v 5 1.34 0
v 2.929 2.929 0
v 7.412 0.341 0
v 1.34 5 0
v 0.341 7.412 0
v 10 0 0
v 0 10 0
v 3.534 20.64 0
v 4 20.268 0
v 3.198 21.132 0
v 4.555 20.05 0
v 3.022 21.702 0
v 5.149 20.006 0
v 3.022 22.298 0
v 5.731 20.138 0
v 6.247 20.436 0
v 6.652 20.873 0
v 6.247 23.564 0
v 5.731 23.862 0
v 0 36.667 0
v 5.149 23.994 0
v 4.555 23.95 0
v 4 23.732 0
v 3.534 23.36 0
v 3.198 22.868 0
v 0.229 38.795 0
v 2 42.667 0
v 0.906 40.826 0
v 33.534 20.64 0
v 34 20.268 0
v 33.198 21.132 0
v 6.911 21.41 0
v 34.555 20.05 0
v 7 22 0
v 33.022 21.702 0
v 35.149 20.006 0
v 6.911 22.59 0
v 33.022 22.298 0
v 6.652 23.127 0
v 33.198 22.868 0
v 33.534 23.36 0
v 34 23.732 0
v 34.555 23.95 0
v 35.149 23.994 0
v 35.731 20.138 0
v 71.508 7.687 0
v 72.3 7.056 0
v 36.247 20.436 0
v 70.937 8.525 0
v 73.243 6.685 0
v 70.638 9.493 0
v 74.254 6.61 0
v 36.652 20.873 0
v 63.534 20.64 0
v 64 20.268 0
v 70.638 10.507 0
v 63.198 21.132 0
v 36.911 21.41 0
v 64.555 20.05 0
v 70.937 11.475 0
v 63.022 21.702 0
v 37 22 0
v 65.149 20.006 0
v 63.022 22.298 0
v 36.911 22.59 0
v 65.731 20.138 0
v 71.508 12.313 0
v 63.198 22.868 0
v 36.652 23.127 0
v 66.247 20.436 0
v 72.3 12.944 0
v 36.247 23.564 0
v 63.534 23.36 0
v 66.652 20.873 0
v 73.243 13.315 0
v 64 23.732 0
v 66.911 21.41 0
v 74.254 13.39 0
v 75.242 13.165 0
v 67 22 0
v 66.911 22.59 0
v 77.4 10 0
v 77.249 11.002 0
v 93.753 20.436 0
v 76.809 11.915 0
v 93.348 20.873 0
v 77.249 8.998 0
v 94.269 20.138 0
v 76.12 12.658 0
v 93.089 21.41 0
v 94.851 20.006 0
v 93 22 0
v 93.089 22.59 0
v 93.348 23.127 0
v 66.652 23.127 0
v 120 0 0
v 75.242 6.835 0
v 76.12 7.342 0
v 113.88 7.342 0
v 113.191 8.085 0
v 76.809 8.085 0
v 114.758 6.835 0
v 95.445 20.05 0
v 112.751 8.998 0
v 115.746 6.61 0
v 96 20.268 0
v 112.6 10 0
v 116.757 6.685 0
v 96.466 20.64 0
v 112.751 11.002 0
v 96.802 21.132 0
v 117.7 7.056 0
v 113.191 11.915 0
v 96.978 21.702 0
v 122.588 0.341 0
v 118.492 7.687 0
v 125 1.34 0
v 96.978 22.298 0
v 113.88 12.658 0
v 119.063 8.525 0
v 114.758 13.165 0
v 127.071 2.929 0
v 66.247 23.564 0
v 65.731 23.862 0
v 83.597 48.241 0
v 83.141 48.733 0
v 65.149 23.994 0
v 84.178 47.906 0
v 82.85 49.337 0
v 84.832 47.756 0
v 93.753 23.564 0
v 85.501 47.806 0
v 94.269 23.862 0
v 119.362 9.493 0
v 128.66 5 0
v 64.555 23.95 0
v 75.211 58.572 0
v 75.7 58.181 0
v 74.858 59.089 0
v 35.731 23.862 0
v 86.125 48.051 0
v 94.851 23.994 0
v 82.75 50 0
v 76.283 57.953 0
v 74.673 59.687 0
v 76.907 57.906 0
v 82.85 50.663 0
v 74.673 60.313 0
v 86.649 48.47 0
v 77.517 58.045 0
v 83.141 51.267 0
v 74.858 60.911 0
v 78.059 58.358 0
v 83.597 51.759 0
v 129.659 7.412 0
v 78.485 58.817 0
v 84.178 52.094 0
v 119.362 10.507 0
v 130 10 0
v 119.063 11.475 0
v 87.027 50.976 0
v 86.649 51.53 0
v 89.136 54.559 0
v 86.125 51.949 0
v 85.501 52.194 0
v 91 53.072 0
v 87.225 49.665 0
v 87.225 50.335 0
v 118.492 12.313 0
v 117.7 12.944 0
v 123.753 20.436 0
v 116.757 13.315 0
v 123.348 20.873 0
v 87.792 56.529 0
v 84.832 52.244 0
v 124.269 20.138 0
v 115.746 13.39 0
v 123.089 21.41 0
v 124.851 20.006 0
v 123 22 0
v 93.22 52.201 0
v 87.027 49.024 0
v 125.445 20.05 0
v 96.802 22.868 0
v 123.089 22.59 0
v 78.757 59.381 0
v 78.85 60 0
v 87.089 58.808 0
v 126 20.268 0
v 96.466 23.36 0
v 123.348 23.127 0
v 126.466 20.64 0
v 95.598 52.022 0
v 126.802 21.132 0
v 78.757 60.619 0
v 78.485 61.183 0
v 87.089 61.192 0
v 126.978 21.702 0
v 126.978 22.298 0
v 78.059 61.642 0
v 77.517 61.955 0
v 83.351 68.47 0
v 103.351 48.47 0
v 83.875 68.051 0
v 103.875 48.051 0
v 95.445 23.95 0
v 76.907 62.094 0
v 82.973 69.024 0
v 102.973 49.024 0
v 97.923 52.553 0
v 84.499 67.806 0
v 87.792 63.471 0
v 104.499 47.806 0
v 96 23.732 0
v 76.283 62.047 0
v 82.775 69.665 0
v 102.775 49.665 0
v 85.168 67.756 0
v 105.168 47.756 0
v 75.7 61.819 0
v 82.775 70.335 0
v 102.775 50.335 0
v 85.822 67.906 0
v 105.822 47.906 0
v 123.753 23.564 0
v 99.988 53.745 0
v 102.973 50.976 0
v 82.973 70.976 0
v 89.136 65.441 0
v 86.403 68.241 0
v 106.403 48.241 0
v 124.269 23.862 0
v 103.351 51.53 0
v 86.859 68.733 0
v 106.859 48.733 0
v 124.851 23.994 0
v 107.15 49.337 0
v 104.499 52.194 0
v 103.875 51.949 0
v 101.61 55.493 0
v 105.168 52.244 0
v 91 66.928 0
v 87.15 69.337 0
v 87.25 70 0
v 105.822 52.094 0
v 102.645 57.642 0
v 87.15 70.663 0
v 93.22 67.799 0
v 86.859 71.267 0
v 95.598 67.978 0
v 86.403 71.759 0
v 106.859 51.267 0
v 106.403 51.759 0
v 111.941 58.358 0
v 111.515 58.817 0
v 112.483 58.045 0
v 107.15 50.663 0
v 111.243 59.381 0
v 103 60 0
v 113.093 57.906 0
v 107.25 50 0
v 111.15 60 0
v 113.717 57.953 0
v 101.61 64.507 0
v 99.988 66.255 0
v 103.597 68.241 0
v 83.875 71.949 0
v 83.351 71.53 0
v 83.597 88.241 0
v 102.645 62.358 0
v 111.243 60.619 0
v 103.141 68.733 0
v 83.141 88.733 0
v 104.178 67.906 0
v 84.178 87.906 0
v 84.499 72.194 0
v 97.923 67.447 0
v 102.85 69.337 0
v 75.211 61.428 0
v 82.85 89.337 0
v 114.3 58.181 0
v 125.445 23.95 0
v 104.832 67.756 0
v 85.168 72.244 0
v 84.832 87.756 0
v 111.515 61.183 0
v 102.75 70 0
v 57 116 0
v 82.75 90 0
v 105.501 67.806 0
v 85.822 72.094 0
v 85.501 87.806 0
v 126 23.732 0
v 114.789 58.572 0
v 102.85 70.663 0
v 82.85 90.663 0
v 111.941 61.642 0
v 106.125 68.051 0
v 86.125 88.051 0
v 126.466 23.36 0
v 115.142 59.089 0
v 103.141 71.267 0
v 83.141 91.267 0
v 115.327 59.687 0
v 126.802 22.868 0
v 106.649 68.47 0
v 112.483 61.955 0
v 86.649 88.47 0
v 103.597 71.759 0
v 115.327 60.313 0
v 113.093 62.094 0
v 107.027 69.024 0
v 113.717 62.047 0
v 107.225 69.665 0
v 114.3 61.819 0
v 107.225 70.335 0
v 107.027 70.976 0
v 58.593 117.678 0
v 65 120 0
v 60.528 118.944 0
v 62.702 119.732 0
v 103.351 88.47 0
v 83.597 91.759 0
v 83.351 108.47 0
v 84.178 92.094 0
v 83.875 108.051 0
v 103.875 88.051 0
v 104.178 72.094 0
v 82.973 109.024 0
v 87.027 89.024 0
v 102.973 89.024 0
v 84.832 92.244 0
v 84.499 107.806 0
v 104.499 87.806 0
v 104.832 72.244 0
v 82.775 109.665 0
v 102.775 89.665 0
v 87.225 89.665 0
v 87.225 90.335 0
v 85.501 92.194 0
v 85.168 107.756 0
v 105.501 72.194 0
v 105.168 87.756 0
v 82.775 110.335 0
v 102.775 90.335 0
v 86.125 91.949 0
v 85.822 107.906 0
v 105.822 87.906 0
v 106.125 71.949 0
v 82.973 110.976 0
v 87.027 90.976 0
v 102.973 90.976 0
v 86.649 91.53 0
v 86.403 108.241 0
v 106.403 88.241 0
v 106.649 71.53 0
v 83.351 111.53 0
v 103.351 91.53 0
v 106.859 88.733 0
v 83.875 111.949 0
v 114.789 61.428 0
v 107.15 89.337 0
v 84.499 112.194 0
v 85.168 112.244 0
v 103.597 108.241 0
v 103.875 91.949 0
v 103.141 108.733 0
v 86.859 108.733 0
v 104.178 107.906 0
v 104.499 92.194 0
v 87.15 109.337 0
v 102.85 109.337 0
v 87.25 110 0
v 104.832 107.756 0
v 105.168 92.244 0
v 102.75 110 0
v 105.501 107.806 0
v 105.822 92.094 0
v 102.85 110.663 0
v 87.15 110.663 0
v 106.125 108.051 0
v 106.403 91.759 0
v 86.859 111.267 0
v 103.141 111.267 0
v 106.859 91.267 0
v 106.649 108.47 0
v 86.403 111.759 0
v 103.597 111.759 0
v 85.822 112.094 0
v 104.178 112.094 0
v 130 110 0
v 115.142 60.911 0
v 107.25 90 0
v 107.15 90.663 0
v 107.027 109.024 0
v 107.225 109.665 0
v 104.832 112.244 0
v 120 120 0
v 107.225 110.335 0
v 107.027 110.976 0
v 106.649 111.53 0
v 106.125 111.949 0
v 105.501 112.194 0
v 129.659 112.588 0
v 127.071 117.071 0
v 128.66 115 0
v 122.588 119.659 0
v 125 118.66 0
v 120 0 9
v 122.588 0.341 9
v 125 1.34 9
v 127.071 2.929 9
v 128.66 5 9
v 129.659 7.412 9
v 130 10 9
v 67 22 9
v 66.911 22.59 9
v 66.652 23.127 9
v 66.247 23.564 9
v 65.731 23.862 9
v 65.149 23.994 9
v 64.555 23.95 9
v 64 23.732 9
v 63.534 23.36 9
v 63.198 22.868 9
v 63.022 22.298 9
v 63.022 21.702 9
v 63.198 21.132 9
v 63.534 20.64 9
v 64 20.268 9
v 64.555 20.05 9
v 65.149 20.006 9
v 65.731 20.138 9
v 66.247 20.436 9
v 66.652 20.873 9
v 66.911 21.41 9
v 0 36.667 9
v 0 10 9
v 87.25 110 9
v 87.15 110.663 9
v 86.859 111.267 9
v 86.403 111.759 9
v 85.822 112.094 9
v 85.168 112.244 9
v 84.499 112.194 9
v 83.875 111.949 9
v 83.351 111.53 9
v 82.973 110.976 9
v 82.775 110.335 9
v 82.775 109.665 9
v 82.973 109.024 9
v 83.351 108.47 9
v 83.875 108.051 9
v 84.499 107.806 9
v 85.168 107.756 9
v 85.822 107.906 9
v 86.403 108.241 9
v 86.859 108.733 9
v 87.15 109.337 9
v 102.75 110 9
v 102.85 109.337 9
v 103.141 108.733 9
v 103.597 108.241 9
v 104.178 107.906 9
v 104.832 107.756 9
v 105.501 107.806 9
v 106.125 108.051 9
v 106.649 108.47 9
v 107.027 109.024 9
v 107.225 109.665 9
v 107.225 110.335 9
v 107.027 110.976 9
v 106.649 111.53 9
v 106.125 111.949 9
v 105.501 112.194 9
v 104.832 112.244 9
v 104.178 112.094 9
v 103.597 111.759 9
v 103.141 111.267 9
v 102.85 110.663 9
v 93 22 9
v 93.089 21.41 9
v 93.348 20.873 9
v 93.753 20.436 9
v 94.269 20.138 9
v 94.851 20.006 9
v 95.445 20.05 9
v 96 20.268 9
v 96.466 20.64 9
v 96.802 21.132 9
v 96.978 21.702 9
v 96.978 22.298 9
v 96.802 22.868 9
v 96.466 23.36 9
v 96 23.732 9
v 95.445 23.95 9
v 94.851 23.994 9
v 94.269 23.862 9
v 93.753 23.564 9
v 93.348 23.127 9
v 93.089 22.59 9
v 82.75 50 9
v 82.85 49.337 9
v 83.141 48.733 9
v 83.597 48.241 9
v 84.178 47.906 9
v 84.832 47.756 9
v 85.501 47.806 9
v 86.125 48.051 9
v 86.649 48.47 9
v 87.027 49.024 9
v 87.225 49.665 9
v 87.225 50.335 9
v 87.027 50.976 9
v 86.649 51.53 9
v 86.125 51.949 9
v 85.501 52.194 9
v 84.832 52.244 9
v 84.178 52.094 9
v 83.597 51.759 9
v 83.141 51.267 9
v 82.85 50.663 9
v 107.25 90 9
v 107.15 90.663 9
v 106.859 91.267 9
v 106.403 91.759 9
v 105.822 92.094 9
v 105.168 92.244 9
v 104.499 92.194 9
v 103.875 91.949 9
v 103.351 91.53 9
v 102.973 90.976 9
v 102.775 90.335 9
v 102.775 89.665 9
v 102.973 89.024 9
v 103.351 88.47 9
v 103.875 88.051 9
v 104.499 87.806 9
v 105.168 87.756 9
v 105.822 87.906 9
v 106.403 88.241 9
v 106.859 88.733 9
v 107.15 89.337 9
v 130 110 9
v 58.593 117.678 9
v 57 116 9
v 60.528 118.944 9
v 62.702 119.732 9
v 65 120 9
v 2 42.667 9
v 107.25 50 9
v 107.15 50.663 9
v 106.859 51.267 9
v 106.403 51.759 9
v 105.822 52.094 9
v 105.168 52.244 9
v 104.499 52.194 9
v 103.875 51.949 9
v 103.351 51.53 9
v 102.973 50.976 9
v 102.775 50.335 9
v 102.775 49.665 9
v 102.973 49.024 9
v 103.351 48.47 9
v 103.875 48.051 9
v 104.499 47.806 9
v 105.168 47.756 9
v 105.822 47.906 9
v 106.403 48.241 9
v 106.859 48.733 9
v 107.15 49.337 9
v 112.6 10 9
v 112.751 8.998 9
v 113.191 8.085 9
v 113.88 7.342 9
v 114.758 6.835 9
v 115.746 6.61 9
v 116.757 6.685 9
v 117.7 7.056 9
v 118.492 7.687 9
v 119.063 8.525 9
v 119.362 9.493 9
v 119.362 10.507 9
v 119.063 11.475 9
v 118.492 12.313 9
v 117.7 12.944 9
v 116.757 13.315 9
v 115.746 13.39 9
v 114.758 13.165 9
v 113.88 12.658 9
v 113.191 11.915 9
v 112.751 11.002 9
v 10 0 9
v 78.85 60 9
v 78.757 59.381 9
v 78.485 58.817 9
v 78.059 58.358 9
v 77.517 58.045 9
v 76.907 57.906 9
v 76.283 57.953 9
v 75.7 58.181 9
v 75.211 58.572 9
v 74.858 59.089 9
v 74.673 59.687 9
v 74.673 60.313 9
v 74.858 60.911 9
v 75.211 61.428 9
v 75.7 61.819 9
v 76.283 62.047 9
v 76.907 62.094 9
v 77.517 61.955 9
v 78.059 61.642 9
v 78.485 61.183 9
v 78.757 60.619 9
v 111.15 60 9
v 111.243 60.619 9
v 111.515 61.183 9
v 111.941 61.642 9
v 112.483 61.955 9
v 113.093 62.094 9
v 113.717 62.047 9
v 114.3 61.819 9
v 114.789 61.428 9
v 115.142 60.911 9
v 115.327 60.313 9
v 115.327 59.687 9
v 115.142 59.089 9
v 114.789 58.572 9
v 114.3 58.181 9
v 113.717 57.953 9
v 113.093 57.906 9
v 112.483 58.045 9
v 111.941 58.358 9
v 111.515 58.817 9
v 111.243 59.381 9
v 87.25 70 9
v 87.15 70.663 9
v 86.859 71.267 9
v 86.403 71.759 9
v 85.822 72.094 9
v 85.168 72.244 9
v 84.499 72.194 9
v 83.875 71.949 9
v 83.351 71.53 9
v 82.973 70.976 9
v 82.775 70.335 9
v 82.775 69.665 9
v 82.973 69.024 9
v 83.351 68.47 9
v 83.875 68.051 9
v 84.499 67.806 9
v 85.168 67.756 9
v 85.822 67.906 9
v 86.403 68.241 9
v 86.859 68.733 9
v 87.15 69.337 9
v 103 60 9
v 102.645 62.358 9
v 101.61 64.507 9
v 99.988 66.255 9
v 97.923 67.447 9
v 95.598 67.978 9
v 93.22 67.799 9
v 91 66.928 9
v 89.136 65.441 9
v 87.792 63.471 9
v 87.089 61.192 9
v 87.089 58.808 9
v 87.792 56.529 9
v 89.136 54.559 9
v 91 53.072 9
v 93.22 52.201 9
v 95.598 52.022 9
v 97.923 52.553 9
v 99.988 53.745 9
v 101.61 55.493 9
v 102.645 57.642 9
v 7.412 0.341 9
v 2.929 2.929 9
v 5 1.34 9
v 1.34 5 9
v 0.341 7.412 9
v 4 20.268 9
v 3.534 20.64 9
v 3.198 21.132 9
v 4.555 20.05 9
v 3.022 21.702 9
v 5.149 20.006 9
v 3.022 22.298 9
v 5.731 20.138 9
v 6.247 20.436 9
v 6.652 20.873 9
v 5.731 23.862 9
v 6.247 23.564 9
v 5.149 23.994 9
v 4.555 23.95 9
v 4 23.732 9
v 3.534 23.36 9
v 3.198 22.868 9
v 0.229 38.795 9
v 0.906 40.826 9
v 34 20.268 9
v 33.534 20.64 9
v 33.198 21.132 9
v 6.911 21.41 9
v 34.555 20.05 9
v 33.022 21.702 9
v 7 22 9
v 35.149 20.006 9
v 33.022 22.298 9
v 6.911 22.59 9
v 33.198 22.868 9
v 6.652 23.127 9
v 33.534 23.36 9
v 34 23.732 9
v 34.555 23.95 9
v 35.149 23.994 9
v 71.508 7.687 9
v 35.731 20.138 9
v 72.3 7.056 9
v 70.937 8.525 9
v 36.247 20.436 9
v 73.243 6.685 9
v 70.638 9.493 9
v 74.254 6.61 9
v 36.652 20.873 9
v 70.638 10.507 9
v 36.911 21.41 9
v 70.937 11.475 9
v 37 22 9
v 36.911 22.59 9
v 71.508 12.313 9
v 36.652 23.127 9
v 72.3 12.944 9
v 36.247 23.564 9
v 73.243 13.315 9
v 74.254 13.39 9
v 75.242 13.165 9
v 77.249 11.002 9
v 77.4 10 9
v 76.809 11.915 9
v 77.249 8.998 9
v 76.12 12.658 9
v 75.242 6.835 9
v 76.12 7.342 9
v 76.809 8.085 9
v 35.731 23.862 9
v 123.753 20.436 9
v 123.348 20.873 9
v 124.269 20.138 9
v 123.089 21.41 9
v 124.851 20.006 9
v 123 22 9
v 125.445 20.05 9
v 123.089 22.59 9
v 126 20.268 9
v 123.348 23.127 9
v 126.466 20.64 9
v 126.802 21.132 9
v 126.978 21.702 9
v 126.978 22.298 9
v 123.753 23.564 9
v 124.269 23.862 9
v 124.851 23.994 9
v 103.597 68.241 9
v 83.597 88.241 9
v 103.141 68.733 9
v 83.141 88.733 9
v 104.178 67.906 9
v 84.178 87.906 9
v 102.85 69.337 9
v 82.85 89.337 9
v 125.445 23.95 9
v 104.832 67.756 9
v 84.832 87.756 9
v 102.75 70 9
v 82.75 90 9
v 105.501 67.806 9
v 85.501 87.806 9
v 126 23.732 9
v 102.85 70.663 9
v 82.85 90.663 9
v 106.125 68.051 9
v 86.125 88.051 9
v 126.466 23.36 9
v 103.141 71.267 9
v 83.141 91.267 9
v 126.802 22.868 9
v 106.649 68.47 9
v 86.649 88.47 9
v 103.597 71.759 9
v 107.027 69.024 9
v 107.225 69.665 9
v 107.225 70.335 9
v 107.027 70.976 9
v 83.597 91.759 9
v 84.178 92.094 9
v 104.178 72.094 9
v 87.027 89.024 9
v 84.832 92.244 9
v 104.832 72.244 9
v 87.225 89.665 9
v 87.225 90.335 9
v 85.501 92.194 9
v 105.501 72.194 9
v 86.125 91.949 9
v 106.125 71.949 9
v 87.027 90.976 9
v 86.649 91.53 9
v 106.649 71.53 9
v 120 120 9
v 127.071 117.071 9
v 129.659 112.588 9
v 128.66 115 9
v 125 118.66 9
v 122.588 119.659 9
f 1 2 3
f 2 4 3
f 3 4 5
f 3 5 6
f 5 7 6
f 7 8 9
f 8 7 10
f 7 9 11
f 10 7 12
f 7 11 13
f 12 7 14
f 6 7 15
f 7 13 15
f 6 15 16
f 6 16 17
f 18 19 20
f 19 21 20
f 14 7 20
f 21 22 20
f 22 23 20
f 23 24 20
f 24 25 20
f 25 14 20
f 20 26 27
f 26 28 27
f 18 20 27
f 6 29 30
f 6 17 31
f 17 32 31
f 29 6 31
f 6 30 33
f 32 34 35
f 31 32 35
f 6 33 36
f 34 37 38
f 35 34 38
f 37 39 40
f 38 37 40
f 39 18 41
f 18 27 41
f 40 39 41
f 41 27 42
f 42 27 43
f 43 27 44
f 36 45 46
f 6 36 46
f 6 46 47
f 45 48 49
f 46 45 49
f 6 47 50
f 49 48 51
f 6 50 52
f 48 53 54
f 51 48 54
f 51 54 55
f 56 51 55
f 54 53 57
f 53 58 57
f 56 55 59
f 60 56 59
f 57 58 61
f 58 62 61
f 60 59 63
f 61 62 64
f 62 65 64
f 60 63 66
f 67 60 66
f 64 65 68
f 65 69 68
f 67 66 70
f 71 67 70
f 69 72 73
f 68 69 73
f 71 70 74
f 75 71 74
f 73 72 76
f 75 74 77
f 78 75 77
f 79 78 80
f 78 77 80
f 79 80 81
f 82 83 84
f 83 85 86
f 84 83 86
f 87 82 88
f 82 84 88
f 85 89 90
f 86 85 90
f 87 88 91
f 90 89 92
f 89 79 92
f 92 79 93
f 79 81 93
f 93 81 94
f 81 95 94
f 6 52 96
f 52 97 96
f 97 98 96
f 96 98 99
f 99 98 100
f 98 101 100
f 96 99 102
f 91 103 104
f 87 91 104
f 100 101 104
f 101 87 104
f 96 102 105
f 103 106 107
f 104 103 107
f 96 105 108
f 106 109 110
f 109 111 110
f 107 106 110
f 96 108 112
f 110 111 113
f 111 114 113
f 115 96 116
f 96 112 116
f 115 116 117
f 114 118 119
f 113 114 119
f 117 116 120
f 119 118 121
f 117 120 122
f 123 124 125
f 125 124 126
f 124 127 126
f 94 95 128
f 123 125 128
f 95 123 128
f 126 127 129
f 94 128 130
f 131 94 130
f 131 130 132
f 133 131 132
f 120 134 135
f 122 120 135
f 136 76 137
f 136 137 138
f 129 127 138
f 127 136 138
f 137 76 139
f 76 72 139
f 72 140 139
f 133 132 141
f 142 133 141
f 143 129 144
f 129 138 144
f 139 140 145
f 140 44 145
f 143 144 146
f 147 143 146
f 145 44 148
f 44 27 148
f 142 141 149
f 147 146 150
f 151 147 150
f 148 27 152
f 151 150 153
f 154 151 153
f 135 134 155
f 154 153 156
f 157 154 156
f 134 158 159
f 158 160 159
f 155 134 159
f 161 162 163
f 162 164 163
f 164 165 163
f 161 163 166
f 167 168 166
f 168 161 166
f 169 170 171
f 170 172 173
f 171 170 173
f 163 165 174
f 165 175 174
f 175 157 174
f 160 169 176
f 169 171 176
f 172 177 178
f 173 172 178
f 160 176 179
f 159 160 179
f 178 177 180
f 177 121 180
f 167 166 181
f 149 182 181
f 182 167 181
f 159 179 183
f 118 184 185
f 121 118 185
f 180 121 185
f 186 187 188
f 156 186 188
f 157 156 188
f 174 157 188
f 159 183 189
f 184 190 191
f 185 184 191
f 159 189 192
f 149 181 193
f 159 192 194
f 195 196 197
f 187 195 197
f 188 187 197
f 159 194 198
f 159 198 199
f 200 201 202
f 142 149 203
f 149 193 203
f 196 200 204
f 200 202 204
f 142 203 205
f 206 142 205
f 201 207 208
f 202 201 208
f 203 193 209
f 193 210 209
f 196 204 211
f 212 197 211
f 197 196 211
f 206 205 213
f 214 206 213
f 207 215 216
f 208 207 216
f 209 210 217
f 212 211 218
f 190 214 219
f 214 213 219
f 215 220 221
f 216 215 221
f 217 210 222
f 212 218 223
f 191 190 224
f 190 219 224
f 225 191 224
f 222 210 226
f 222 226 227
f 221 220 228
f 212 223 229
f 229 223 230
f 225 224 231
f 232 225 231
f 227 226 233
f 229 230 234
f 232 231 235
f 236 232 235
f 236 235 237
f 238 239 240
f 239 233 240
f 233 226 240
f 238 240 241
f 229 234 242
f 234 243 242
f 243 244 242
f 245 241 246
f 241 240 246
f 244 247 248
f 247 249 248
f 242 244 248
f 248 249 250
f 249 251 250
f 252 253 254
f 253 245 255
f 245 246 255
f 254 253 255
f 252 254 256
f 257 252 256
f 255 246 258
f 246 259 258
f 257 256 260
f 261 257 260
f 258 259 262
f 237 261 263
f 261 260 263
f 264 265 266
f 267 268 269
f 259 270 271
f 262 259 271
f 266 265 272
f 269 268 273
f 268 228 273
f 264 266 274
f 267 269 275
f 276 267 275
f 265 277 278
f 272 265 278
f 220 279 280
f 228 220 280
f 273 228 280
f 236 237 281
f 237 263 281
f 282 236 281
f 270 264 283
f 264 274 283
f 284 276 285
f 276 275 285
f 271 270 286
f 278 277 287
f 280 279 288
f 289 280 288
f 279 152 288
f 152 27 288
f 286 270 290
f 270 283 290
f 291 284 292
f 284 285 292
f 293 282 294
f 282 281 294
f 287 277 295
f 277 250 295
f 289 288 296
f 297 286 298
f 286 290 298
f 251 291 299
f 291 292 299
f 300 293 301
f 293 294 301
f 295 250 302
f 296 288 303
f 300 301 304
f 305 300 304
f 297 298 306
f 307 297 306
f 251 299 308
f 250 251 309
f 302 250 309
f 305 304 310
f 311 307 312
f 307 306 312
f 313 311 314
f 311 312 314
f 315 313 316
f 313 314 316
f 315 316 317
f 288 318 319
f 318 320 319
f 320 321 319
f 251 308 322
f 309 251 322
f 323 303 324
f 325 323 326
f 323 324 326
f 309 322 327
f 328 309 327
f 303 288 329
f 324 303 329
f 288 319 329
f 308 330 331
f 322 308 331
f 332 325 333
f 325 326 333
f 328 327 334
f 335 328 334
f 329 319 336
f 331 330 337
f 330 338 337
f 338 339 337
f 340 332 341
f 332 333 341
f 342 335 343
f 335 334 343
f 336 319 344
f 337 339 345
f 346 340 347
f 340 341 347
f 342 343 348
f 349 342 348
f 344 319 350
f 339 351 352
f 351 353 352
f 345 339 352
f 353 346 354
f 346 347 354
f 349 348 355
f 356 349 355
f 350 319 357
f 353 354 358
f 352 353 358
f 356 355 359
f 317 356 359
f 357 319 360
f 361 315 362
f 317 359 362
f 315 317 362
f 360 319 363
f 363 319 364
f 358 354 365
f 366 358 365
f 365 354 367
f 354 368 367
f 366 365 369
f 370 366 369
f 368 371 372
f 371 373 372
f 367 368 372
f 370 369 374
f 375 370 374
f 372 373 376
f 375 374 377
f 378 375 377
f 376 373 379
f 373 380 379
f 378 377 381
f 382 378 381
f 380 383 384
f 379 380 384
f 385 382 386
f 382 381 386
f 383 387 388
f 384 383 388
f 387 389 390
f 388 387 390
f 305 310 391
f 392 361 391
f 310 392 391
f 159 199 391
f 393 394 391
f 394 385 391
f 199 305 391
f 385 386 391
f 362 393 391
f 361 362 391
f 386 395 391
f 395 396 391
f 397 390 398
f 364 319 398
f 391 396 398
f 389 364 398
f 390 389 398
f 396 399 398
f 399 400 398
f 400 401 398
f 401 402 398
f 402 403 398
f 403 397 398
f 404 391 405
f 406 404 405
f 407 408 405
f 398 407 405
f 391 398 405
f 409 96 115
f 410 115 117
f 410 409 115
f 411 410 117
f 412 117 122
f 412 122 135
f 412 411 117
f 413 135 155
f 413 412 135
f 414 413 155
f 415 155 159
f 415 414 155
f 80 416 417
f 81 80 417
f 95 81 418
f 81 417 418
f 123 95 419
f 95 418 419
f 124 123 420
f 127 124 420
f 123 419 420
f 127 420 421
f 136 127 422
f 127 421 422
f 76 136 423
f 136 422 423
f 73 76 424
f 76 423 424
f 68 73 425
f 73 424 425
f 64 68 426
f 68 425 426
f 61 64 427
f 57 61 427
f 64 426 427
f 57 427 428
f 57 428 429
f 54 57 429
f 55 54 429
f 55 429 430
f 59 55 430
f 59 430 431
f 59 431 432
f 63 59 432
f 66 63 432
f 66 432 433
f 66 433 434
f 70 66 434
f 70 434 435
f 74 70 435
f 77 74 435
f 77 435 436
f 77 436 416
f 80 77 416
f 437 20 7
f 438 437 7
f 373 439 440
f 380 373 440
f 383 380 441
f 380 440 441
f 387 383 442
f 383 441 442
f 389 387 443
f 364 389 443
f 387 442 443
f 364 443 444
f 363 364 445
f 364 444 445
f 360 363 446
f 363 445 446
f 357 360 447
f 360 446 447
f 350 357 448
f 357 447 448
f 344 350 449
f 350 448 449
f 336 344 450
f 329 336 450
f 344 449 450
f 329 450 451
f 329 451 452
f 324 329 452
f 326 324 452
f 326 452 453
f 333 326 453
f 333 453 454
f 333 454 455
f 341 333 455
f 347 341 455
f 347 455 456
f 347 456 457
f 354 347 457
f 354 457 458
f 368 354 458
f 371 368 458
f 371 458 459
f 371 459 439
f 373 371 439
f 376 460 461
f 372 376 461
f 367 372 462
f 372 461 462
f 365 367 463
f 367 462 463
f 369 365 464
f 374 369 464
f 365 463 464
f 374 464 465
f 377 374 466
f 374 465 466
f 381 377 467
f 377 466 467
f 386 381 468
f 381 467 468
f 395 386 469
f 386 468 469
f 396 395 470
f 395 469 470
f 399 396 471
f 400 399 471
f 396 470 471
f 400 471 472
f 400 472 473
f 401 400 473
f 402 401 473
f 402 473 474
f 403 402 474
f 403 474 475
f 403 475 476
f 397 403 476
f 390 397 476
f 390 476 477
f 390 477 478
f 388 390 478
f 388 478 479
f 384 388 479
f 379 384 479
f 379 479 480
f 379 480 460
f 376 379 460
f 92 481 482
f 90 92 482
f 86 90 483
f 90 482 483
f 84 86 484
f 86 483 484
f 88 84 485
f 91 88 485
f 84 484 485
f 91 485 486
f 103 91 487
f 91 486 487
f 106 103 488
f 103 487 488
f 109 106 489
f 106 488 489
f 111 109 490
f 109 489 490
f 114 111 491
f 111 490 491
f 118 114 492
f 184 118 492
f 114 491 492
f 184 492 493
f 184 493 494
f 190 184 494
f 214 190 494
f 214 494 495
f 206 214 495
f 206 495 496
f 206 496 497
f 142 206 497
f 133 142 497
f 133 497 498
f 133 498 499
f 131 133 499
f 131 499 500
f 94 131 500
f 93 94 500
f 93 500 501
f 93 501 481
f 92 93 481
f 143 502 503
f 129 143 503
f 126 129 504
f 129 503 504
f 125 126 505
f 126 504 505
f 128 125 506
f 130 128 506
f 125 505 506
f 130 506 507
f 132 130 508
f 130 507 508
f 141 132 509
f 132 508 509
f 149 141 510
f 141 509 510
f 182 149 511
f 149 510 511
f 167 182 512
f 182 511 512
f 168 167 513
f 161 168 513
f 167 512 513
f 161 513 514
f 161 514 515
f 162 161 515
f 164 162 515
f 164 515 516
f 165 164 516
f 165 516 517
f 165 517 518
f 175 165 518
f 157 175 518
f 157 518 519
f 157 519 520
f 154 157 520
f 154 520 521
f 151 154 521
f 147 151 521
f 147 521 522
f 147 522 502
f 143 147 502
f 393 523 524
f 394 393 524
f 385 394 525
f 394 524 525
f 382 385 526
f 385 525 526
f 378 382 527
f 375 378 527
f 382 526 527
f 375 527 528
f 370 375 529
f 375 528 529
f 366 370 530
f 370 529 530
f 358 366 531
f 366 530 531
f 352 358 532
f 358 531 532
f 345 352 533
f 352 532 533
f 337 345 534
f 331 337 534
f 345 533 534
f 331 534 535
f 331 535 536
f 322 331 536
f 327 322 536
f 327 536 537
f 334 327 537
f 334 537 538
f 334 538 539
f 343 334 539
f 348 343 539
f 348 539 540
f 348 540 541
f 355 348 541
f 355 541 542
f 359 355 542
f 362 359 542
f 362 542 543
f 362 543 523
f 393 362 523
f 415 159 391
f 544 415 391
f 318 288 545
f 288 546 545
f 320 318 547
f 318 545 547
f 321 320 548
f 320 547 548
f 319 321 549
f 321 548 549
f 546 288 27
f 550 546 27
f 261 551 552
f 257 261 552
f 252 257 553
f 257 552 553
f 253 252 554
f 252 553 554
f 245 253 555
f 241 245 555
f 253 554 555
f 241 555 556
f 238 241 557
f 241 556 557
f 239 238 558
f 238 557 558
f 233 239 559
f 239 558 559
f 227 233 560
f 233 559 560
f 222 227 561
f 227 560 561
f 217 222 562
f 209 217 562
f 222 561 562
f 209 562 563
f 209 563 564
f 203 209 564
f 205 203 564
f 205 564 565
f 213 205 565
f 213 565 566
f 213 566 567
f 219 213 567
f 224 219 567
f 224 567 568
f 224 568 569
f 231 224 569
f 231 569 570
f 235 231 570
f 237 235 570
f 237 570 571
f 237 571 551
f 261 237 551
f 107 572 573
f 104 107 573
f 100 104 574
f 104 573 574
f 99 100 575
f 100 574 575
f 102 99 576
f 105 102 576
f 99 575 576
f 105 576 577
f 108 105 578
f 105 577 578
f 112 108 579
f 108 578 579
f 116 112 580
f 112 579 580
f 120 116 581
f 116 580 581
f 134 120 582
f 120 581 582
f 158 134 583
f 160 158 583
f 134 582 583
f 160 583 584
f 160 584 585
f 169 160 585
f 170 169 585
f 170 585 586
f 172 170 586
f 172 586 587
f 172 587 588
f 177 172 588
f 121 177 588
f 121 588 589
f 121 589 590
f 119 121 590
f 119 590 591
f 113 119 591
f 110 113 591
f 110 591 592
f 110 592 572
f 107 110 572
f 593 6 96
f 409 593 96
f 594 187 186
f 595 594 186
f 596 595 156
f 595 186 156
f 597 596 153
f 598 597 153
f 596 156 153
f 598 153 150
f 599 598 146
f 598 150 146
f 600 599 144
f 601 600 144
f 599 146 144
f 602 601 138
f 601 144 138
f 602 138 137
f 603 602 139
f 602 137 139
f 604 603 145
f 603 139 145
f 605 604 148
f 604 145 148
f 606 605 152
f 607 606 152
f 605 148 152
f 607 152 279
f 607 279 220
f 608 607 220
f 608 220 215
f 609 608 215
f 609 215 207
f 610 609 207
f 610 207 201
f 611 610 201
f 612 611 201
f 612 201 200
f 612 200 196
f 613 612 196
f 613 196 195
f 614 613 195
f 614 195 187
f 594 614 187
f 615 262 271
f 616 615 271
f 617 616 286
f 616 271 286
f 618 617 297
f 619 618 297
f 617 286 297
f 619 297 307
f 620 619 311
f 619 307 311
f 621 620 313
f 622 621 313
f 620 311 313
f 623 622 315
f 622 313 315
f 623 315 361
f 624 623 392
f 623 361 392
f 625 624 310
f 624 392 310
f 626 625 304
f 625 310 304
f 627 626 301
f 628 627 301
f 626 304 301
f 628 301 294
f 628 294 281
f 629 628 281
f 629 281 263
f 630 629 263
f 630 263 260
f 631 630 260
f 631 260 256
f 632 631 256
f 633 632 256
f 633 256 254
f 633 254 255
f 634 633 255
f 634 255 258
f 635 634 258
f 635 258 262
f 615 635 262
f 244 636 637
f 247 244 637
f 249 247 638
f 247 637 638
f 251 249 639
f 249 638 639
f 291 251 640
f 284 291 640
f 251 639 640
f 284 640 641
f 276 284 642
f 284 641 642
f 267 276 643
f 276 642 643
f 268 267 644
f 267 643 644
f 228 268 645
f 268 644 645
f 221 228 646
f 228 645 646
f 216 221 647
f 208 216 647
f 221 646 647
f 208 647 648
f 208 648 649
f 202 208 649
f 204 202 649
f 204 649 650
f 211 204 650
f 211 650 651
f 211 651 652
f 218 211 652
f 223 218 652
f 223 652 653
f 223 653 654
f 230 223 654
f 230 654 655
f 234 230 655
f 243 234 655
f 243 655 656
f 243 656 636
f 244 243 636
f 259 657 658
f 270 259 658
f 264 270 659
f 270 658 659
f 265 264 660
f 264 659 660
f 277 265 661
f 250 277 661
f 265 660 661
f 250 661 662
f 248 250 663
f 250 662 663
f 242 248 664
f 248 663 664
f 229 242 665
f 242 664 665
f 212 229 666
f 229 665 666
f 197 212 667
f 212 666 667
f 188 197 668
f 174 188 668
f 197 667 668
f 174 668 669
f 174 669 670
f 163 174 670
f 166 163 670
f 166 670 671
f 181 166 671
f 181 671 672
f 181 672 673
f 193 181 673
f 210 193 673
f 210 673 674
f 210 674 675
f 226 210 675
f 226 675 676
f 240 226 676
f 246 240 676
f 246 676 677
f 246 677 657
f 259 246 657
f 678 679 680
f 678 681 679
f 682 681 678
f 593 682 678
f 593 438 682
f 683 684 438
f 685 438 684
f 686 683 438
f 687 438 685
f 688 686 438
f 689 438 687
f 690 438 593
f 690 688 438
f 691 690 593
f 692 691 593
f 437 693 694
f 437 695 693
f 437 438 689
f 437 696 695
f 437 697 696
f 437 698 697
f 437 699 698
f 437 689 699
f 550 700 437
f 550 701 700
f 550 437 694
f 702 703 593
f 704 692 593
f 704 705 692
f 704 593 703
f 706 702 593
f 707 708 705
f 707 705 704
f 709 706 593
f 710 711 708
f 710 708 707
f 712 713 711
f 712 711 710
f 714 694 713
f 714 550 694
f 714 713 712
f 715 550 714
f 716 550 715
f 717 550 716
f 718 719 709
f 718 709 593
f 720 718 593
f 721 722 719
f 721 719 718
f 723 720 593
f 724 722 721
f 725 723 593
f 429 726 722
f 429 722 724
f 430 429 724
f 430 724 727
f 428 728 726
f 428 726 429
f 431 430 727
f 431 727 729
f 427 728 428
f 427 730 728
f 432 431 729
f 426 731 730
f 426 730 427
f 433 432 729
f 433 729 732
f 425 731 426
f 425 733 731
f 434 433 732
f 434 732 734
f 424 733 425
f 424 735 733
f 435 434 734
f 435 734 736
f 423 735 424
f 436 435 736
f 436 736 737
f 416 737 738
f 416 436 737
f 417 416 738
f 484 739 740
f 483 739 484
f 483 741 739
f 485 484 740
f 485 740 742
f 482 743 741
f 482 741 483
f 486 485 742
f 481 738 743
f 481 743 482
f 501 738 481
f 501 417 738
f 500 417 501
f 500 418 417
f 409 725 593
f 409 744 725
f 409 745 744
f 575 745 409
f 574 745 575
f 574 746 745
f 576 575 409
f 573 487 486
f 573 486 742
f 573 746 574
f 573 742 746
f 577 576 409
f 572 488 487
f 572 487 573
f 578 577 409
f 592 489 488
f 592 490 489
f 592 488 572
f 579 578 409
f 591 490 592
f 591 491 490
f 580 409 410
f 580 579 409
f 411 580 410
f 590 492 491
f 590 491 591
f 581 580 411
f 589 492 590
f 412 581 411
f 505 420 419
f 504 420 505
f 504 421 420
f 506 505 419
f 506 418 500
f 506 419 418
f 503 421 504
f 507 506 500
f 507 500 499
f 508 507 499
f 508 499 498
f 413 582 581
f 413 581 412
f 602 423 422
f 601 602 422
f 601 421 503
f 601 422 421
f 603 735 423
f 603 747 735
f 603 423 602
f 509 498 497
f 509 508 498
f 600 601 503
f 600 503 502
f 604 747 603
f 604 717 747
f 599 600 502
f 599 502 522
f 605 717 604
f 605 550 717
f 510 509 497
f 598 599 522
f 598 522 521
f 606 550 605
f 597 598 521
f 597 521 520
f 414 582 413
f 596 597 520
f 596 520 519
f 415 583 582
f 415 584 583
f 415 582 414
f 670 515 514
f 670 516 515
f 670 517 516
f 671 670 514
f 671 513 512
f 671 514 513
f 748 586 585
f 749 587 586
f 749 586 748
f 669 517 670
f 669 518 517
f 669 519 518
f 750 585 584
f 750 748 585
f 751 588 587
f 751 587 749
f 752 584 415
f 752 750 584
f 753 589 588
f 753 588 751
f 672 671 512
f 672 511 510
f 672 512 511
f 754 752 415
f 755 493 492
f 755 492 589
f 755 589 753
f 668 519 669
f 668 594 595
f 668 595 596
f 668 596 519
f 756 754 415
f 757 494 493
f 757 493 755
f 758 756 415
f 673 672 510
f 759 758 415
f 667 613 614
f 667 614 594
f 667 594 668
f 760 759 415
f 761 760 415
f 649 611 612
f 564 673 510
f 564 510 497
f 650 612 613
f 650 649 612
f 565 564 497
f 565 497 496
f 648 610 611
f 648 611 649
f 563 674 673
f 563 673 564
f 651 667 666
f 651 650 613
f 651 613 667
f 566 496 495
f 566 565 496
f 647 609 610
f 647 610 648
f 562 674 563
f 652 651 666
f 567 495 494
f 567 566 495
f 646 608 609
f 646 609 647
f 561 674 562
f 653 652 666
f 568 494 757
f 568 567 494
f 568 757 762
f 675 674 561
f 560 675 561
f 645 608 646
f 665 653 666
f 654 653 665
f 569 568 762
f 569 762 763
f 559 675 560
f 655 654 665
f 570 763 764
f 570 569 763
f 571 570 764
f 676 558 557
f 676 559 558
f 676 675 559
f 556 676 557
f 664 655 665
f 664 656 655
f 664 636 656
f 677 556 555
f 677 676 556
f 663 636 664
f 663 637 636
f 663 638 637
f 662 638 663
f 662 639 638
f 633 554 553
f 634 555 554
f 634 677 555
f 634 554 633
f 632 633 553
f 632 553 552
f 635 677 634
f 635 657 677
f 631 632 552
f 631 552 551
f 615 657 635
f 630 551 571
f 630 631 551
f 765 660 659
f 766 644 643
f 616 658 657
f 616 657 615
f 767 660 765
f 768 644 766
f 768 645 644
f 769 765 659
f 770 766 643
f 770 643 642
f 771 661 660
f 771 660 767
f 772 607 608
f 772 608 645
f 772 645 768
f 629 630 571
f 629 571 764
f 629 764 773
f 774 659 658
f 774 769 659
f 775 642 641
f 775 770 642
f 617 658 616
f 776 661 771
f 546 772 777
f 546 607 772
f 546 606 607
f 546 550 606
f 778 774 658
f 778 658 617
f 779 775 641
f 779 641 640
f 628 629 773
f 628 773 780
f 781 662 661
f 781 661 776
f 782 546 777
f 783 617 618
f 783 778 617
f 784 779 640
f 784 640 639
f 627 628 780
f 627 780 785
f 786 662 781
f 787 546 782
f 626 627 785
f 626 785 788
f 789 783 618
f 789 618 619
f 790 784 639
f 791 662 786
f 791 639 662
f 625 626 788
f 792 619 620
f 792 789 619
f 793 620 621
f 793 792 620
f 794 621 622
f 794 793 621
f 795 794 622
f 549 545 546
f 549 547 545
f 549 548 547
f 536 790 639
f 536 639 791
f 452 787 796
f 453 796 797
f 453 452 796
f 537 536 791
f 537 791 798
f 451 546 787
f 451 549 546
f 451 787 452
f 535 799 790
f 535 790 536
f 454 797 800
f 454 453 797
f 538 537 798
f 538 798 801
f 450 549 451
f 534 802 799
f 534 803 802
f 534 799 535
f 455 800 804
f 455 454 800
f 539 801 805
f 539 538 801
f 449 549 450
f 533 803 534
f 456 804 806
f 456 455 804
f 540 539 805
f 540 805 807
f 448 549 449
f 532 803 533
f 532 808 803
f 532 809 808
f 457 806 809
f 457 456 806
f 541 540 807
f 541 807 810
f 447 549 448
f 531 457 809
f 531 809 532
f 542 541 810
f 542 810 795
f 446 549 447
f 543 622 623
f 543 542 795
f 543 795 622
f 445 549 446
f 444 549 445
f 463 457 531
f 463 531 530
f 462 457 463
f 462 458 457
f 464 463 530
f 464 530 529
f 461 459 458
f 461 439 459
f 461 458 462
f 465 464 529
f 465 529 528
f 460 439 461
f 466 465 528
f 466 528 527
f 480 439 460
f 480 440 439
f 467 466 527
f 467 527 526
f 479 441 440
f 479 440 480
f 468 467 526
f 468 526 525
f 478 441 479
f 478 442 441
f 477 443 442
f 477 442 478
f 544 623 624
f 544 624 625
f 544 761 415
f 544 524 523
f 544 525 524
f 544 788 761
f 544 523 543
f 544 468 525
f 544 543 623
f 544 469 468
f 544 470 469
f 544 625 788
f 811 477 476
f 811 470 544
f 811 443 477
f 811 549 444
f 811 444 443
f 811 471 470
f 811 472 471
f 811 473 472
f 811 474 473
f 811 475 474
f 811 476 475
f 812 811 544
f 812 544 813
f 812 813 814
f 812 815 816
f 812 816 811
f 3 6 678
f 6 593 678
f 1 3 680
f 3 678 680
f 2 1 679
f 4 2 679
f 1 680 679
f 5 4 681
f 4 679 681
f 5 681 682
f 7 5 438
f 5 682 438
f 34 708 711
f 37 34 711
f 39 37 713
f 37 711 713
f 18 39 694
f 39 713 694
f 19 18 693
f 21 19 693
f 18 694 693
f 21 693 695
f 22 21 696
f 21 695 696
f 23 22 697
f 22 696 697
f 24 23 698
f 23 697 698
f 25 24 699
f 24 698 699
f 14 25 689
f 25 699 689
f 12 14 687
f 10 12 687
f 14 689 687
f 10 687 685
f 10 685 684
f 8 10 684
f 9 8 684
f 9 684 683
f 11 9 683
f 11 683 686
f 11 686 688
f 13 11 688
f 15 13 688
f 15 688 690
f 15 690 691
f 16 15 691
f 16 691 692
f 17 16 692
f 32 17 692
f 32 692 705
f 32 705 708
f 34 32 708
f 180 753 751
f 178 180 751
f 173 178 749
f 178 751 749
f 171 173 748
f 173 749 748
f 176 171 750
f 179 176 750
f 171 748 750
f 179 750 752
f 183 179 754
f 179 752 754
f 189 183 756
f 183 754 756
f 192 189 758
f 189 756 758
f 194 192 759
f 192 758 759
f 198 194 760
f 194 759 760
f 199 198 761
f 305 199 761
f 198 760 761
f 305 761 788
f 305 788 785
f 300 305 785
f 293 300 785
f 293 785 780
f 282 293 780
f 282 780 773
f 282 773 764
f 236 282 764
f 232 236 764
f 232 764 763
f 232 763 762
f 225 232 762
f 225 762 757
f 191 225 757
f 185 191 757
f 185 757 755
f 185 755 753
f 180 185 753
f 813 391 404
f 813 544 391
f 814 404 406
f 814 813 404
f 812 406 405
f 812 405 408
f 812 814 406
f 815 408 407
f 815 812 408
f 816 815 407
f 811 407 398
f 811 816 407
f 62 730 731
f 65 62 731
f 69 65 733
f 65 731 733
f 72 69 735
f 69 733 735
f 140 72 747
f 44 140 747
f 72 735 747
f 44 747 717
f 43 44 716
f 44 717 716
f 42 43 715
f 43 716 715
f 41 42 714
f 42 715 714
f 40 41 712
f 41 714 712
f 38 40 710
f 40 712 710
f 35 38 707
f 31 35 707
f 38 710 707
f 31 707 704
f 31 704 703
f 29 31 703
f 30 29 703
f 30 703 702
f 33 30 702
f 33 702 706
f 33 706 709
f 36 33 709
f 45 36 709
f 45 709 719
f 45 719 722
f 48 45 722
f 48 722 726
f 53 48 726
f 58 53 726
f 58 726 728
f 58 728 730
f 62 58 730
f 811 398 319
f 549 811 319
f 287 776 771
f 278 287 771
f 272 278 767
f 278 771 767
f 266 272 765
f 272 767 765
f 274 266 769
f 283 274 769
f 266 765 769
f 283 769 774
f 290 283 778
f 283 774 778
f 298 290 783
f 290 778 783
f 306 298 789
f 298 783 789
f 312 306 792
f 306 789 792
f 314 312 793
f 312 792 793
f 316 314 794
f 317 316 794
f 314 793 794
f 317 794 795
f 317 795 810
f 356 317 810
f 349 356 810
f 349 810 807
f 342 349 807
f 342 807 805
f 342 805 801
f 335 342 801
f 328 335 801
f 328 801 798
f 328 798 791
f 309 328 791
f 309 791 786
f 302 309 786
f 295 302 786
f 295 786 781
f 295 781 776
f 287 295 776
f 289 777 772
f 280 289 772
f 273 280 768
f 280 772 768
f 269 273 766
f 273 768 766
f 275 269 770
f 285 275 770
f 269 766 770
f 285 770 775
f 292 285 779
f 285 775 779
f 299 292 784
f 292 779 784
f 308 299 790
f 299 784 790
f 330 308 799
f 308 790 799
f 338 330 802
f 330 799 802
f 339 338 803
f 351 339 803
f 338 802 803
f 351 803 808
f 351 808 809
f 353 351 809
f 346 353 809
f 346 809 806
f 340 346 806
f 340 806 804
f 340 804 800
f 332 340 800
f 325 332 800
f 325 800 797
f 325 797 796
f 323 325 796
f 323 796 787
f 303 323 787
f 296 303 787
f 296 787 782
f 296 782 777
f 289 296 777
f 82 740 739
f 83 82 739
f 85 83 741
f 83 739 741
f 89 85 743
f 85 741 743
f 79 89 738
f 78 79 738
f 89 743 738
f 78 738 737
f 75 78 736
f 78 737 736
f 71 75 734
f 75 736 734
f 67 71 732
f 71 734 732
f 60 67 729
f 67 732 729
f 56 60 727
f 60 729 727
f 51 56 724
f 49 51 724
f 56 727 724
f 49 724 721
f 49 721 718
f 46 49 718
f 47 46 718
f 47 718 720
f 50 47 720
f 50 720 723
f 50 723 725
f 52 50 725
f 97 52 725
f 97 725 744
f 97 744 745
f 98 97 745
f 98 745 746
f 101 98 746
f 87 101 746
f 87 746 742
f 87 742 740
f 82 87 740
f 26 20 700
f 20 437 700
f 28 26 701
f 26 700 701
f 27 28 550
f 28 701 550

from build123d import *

# Parameters (mm, degrees)
BOSS_EXTRU_1_DEPTH      = 9
ESQUISSE2_R             = 2
ESQUISSE2_R_2           = 2.25
ENL_V_MAT_EXTRU_1_DEPTH = 178.146831753
ESQUISSE3_R             = 8
ESQUISSE3_R_2           = 3.4
ENL_V_MAT_EXTRU_2_DEPTH = 178.146831753
CONG_1_R                = 10
ESQUISSE6_R             = 2.1
ENL_V_MAT_EXTRU_4_DEPTH = 178.146831753


with BuildPart() as part:
    # Esquisse1 → Boss.-Extru.1 (new body)
    with BuildSketch(Plane.XY):
        Polygon((0, 0), (130, 0), (130, 120), (60, 120), (0, 40), align=None)
    extrude(amount=BOSS_EXTRU_1_DEPTH)

    # Esquisse2 → Enlèv. mat.-Extru.1 (cut, through all)
    with BuildSketch(Plane.XY.offset(9)):
        with Locations((65, 22)):
            Circle(ESQUISSE2_R)
        with Locations((35, 22)):
            Circle(ESQUISSE2_R)
        with Locations((5, 22)):
            Circle(ESQUISSE2_R)
        with Locations(Location((125, 22, 0), (0, 0, 180))):
            Circle(ESQUISSE2_R)
        with Locations(Location((95, 22, 0), (0, 0, 180))):
            Circle(ESQUISSE2_R)
        with Locations((85, 110)):
            Circle(ESQUISSE2_R_2)
        with Locations(Location((85, 90, 0), (0, 0, 180))):
            Circle(ESQUISSE2_R_2)
        with Locations((105, 90)):
            Circle(ESQUISSE2_R_2)
        with Locations(Location((105, 110, 0), (0, 0, 180))):
            Circle(ESQUISSE2_R_2)
        with Locations((105, 50)):
            Circle(ESQUISSE2_R_2)
        with Locations(Location((105, 70, 0), (0, 0, 180))):
            Circle(ESQUISSE2_R_2)
        with Locations((85, 70)):
            Circle(ESQUISSE2_R_2)
        with Locations(Location((85, 50, 0), (0, 0, 180))):
            Circle(ESQUISSE2_R_2)
    extrude(amount=-ENL_V_MAT_EXTRU_1_DEPTH, mode=Mode.SUBTRACT)

    # Esquisse3 → Enlèv. mat.-Extru.2 (cut, through all)
    with BuildSketch(Plane.XY.offset(9)):
        with Locations((95, 60)):
            Circle(ESQUISSE3_R)
        with Locations((74, 10)):
            Circle(ESQUISSE3_R_2)
        with Locations(Location((116, 10, 0), (0, 0, 180))):
            Circle(ESQUISSE3_R_2)
    extrude(amount=-ENL_V_MAT_EXTRU_2_DEPTH, mode=Mode.SUBTRACT)

    # Congé1
    cong_1_edges = [part.edges().sort_by_distance(p)[0] for p in [
        (0, 40, 4.5),
        (60, 120, 4.5),
        (130, 120, 4.5),
        (130, 0, 4.5),
        (0, 0, 4.5),
    ]]
    fillet(cong_1_edges, radius=CONG_1_R)

    # Esquisse6 → Enlèv. mat.-Extru.4 (cut, through all)
    with BuildSketch(Plane(origin=(0, 0, 0), x_dir=(-1, 0, 0), z_dir=(0, 0, -1))):
        with Locations((-113.25, 60)):
            Circle(ESQUISSE6_R)
        with Locations(Location((-76.75, 60, 0), (0, 0, 180))):
            Circle(ESQUISSE6_R)
    extrude(amount=-ENL_V_MAT_EXTRU_4_DEPTH, mode=Mode.SUBTRACT)


solid = part.part
